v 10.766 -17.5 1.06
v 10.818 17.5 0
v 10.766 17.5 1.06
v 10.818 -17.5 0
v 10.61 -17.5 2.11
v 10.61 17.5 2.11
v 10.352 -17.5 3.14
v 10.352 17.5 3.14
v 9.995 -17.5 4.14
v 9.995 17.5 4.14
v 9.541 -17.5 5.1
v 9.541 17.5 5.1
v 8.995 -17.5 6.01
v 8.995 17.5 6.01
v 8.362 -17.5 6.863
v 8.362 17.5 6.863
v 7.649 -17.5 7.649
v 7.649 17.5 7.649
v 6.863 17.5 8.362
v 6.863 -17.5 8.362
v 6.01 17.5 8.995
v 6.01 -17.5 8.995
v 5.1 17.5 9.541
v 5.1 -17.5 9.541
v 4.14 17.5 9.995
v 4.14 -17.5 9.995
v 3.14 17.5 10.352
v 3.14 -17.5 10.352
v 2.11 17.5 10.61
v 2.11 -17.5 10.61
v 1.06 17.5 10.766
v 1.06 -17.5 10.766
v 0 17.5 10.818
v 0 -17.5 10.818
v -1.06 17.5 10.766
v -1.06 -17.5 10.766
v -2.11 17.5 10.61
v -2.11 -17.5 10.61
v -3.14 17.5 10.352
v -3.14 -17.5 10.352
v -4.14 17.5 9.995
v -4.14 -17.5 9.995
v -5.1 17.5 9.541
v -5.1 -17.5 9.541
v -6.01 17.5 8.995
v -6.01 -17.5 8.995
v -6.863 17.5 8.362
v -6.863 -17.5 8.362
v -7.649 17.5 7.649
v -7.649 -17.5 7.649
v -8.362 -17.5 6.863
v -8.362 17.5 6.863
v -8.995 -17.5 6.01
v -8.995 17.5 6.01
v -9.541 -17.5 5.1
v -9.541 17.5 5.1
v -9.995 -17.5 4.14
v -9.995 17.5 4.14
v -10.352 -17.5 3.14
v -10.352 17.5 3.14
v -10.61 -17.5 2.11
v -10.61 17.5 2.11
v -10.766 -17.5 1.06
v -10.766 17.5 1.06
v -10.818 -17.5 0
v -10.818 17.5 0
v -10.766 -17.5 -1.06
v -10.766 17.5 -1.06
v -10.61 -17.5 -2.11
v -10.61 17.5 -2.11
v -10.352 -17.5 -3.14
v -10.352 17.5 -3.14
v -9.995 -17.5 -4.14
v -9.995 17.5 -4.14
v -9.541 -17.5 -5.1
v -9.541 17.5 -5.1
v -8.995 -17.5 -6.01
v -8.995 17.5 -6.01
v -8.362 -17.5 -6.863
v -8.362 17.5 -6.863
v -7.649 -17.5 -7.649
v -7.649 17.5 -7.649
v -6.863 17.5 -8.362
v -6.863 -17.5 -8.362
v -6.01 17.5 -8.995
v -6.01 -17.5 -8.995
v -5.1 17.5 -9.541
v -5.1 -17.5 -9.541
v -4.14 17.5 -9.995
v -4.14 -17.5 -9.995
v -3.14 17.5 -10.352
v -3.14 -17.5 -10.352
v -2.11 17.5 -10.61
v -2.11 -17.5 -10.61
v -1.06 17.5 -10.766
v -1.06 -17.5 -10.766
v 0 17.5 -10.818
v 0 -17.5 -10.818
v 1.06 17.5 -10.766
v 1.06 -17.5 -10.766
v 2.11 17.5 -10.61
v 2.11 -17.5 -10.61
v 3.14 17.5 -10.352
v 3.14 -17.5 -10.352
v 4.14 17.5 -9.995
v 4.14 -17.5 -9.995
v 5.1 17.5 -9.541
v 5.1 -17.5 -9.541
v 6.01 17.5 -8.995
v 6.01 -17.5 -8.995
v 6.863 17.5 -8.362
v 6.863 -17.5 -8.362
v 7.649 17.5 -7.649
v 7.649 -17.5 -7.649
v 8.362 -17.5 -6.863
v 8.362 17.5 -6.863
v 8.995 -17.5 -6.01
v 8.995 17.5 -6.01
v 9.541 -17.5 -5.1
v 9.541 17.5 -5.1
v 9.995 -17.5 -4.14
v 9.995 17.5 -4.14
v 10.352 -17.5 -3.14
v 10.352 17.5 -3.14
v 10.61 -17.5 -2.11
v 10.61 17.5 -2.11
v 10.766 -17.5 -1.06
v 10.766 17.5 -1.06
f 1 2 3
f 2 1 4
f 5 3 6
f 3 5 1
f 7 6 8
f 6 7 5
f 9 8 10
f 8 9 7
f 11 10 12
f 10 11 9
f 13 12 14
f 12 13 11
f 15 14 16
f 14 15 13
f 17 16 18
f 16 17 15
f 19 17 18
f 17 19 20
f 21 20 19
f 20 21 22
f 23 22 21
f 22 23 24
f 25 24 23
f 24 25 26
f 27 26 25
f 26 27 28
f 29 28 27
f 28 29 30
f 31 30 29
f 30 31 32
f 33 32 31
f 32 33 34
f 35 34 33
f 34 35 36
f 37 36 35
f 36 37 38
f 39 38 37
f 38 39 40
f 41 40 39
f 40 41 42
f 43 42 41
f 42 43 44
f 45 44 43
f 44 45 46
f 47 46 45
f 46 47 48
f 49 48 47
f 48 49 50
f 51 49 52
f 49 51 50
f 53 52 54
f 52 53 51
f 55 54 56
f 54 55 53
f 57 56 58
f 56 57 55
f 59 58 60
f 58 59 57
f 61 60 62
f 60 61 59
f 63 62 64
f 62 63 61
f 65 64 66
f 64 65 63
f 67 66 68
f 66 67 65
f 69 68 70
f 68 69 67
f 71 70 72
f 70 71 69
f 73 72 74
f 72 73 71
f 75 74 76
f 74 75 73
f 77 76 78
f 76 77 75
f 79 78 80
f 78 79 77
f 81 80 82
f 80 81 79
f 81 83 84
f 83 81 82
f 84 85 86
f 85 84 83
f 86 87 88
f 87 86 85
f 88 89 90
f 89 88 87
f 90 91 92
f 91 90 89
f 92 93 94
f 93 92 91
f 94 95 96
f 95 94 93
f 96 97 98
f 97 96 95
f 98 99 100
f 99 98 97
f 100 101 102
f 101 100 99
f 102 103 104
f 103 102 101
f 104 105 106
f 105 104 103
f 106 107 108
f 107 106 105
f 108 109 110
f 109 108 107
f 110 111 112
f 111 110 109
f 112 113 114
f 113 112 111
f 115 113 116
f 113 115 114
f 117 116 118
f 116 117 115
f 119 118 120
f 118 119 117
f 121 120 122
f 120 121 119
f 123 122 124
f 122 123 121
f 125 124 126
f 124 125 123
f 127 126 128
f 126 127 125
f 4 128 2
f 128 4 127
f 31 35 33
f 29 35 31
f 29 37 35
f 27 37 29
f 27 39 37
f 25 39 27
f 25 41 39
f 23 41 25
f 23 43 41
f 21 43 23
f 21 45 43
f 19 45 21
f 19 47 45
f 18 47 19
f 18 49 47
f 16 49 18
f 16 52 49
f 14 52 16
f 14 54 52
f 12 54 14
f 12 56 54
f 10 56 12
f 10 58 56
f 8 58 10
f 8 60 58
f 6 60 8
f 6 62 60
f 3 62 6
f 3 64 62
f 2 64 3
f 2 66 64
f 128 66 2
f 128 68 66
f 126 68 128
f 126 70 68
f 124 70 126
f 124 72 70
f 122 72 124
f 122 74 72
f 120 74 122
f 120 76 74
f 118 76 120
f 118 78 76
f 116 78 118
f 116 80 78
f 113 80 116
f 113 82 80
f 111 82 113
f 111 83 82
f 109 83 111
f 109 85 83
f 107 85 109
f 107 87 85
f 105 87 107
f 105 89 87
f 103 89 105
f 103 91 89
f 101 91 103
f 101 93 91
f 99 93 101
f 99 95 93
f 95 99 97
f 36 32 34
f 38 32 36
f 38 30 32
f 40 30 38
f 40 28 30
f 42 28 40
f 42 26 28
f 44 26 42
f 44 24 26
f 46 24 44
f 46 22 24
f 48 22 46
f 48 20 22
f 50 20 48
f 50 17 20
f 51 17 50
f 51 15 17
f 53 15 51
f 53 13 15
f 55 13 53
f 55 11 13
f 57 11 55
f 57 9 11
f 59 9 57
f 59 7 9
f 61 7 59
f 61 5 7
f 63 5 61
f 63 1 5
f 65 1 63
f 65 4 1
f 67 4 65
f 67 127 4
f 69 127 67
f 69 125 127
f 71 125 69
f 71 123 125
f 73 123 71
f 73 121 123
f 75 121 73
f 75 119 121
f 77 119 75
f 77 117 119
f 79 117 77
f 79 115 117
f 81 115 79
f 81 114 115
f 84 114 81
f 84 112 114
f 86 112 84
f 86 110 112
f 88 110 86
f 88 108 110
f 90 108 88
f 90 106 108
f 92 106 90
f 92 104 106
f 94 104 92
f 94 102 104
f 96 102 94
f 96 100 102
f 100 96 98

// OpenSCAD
// This generates geometry for creating PVC pipe fittings
// Licenced under Creative Commons: Attribution, Share-Alike
//		http://creativecommons.org/licenses/by-sa/3.0/
// For attribution you can direct people to the original file on thingiverse:
// 		http://www.thingiverse.com/thing:222574

// ================ variables

//CUSTOMIZER VARIABLES

/* [Main] */

// Rated strength
schedule=40; // [40:schedule_40,1:schedule_80]

// Nominal size ("inch")
nom_idx=0; // [0:1/2,1:3/4,2:1,3:1 1/4,4:1 1/2,5:2,6:2 1/2,7:3,8:4,9:5,10:6,11:8,12:10,13:12,14:14,15:16]

// Length in mm
length=35;

// What to generate
generate=1; // [0:outside fitting,1:outside fitting - boolean diff,2:inside fitting,3:inside fitting - boolean diff,4:inside outside,5:inside outside - boolean diff]

// Tightness of fit, in mm (0=tight 0.3=snug 0.6=loose)
tightness=0.3; // 0.0,1.0

// In points per cylinder
resolution=64;

//CUSTOMIZER VARIABLES END
/* [Hidden] */

// =============== calculated variables
$fn=resolution;

// =============== program

// ---- Data
nom_data=["1/2","3/4","1","1 1/4","1 1/2","2","2 1/2","3","4","5","6","8","10","12","14","16"];
sch40id_data=[0.622,0.824,1.049,1.38,1.61,2.067,2.469,3.068,4.026,5.047,6.065,7.981,10.02,11.938,13.124,15];
sch40od_data=[0.84,1.05,1.315,1.66,1.9,2.375,2.875,3.5,4.5,5.563,6.625,8.625,10.75,12.75,14,16];
sch40pvcweight_data=[0.16,0.21,0.32,0.43,0.51,0.68,1.07,1.41,2.01,2.73,3.53,5.39,7.55,10.01,11.8,15.43];
sch40cpvcweight_data=[0.17,0.23,0.34,0.46,0.55,0.74,1.18,1.54,2.2,-1,3.86,5.81,8.24,10.89,-1,-1];
sch80id_data=[0.546,0.742,0.957,1.278,1.5,1.939,2.323,2.9,3.826,4.813,5.761,7.625,9.564,11.376,12.5,14.314];
sch80od_data=[0.84,1.05,1.315,1.66,1.9,2.375,2.875,3.5,4.5,5.563,6.625,8.625,10.75,12.75,14,16];
sch80pvcweight_data=[0.2,0.27,0.41,0.52,0.67,0.95,1.45,1.94,2.75,3.87,5.42,8.05,12,16.5,19.3,25.44];
sch80cpvcweight_data=[0.22,0.3,0.44,0.61,0.74,1.02,1.56,2.09,3.05,-1,5.82,8.83,13.09,18,-1,-1];
thou2mm=25.4;

//---- Functions

/////////////////////////////////////////////////////////
// module create_pvc_component()
// This generates geometry for creating PVC pipe fittings.
// In general, you should use create_pvc() instead because it gives more options.
// schedule = Rated strength (40 or 80)
// nom_idx = Nominal size index as described by nom_data[] 
// length - Length in mm
// generate - What to generate:
//		0="outside fitting"
//		1="outside fitting - boolean diff"
//		2="inside fitting"
//		3="inside fitting - boolean diff"
// tightness - Tightness of fit, in mm (0=tight 0.3=snug 0.6=loose)
module create_pvc_component(schedule=40,nom_idx=0,generate=0,tightness=0.02,length=35) {
	dia=
	(thou2mm*(schedule==80 ?
		(generate==0||generate==1?sch80od_data[nom_idx]:sch80id_data[nom_idx])
		:
		(generate==0||generate==1?sch40od_data[nom_idx]:sch40id_data[nom_idx])
	))
	+(generate==2||generate==3?-tightness:tightness);
	echo("========== INFO ==========");
	echo(str("for ",nom_data[nom_idx],"in (nom) pipe"));
	echo(str("created ",dia,"mm dia part"));
	echo(str("including ",(generate==2||generate==3?-tightness:tightness),"mm for fit"));
	echo("==========================");
	// now draw it
	rotate([90,0,0]) if(generate==1||generate==3){
		cylinder(r=dia/2,h=length,center=true);
	}else{
		difference() {
			cube([dia+10,dia+10,length],center=true);
			cylinder(r=dia/2,h=length,center=true);
		}
	}
};

/////////////////////////////////////////////////////////
// module create_pvc()
// This generates geometry for creating PVC pipe fittings.
// Just like create_pvc_component() only adds generate options 4 and 5
// schedule = Rated strength (40 or 80)
// nom_idx = Nominal size index as described by nom_data[] 
// length - Length in mm
// generate - What to generate:
//		0="outside fitting"
//		1="outside fitting - boolean diff"
//		2="inside fitting"
//		3="inside fitting - boolean diff"
//		4="inside outside"
//		5="inside outside - boolean diff"
// tightness - Tightness of fit, in mm (0=tight 0.3=snug 0.6=loose)
module create_pvc(schedule=40,nom_idx=0,generate=0,tightness=0.02,length=35) {
	if(generate<=3){
		create_pvc_component(schedule,nom_idx,generate,tightness,length);
	}
	else if(generate==4){
		difference() {
			create_pvc_component(schedule,nom_idx,1,tightness,length);
			create_pvc_component(schedule,nom_idx,3,tightness,length*2);
		}
	}
	else{
		union() {
			create_pvc_component(schedule,nom_idx,0,tightness,length);
			create_pvc_component(schedule,nom_idx,3,tightness,length);
		}
	}
};

//---- The program
create_pvc(schedule,nom_idx,generate,tightness,length);
